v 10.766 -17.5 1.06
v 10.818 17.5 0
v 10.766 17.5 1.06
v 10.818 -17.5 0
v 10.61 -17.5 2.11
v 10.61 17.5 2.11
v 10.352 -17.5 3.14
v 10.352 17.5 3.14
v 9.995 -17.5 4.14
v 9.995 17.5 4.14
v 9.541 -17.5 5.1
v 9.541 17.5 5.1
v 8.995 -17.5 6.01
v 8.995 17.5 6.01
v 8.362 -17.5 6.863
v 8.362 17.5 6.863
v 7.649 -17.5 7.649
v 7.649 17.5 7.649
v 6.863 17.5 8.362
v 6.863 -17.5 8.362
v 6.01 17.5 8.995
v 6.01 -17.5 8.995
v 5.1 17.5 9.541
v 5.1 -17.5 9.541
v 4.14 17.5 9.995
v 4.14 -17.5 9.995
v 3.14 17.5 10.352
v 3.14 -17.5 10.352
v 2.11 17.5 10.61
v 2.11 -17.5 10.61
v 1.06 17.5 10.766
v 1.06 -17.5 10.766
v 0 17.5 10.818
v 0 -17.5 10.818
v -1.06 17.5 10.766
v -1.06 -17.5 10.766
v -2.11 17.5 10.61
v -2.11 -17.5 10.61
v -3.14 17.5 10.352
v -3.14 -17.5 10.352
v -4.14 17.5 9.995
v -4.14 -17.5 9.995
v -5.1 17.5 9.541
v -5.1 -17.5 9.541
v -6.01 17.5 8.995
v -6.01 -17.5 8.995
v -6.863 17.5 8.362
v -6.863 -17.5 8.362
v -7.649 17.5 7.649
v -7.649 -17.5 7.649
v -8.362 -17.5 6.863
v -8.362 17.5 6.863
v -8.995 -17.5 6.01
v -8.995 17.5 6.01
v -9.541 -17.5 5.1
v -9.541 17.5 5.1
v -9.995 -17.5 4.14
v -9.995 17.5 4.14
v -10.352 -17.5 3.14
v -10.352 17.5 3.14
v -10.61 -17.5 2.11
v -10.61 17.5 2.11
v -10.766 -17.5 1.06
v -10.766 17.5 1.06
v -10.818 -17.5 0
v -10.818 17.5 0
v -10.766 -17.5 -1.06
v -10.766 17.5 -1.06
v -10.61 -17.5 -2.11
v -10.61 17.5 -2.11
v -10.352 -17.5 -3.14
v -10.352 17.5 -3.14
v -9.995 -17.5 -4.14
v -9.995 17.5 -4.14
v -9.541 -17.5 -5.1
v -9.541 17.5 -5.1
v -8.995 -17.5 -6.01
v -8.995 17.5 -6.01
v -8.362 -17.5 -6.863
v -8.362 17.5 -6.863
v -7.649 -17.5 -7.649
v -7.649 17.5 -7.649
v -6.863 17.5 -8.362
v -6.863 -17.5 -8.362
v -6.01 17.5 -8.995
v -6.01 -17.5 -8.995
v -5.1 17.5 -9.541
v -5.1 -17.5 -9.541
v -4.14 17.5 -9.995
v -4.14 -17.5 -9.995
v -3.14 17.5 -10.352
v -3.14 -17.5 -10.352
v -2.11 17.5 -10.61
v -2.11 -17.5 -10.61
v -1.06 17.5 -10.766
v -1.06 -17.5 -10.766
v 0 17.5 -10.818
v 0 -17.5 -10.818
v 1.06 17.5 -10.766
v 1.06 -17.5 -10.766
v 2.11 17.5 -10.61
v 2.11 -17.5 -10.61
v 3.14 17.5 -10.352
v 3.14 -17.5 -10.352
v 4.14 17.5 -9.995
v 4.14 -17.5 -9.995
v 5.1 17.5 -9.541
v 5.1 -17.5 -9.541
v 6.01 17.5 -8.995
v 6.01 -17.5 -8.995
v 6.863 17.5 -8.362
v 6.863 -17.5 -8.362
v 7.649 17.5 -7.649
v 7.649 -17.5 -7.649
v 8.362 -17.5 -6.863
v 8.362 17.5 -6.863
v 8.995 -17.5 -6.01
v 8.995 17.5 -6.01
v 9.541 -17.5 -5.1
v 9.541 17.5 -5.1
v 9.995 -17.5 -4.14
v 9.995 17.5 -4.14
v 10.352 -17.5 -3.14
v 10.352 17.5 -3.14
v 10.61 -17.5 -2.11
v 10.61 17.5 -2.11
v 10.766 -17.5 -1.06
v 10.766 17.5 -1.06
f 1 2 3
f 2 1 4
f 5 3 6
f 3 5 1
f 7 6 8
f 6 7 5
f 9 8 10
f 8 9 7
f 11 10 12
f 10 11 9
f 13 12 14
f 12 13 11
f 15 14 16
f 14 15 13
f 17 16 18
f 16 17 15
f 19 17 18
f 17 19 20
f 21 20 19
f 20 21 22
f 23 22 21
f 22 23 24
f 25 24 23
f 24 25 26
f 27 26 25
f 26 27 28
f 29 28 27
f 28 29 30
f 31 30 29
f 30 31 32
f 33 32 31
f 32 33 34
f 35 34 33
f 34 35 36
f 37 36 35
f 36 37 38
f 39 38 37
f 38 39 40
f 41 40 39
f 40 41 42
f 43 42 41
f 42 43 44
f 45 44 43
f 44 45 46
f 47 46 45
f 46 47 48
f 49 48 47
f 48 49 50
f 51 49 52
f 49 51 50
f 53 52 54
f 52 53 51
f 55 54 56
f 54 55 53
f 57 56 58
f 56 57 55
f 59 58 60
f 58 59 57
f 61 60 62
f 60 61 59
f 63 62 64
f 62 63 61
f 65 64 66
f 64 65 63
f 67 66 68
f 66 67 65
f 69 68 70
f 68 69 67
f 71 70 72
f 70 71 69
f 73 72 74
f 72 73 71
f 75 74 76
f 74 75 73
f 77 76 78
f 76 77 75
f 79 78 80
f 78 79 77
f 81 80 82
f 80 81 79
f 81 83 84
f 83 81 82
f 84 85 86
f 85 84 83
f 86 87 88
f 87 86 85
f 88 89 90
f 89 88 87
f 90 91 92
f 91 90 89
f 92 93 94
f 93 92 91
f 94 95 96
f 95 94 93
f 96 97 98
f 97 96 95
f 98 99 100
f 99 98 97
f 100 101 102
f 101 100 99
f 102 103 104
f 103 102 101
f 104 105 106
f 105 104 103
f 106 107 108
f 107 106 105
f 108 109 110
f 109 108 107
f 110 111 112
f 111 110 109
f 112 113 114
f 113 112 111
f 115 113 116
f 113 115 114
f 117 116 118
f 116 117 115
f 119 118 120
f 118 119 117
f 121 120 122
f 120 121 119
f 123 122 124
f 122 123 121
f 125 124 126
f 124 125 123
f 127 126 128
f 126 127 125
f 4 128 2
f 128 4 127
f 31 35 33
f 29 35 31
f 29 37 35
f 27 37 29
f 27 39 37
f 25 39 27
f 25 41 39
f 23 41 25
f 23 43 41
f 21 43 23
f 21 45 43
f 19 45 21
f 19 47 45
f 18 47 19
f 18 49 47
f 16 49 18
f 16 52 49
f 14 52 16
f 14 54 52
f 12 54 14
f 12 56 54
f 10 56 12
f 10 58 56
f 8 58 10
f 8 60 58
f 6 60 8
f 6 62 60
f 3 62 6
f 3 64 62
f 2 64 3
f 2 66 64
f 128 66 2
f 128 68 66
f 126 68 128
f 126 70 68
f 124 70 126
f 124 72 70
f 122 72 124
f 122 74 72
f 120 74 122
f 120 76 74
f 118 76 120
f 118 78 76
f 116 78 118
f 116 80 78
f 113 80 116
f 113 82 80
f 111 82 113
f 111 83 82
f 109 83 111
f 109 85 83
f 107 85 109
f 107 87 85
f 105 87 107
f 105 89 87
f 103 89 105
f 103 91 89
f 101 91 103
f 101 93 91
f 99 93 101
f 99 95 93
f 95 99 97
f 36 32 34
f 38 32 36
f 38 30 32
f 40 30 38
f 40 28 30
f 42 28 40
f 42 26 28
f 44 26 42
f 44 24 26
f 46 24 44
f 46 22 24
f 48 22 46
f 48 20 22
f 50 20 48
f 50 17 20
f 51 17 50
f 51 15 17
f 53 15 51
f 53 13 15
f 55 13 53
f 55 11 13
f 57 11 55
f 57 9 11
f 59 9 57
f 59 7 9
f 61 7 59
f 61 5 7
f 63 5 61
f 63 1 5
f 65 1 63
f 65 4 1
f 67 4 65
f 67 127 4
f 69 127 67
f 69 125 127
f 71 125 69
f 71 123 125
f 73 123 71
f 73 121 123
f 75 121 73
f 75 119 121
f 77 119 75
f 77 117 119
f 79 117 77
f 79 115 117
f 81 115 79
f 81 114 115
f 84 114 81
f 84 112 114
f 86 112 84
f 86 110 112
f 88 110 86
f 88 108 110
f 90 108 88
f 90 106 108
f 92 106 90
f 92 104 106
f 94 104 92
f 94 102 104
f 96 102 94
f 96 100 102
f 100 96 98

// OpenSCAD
// This generates geometry for creating PVC pipe fittings
// Licenced under Creative Commons: Attribution, Share-Alike
//		http://creativecommons.org/licenses/by-sa/3.0/
// For attribution you can direct people to the original file on thingiverse:
// 		http://www.thingiverse.com/thing:222574

// ================ variables

//CUSTOMIZER VARIABLES

/* [Main] */

// Rated strength
schedule=40; // [40:schedule_40,1:schedule_80]

// Nominal size ("inch")
nom_idx=0; // [0:1/2,1:3/4,2:1,3:1 1/4,4:1 1/2,5:2,6:2 1/2,7:3,8:4,9:5,10:6,11:8,12:10,13:12,14:14,15:16]

// Length in mm
length=35;

// What to generate
generate=1; // [0:outside fitting,1:outside fitting - boolean diff,2:inside fitting,3:inside fitting - boolean diff,4:inside outside,5:inside outside - boolean diff]

// Tightness of fit, in mm (0=tight 0.3=snug 0.6=loose)
tightness=0.3; // 0.0,1.0

// In points per cylinder
resolution=64;

//CUSTOMIZER VARIABLES END
/* [Hidden] */

// =============== calculated variables
$fn=resolution;

// =============== program

// ---- Data
nom_data=["1/2","3/4","1","1 1/4","1 1/2","2","2 1/2","3","4","5","6","8","10","12","14","16"];
sch40id_data=[0.622,0.824,1.049,1.38,1.61,2.067,2.469,3.068,4.026,5.047,6.065,7.981,10.02,11.938,13.124,15];
sch40od_data=[0.84,1.05,1.315,1.66,1.9,2.375,2.875,3.5,4.5,5.563,6.625,8.625,10.75,12.75,14,16];
sch40pvcweight_data=[0.16,0.21,0.32,0.43,0.51,0.68,1.07,1.41,2.01,2.73,3.53,5.39,7.55,10.01,11.8,15.43];
sch40cpvcweight_data=[0.17,0.23,0.34,0.46,0.55,0.74,1.18,1.54,2.2,-1,3.86,5.81,8.24,10.89,-1,-1];
sch80id_data=[0.546,0.742,0.957,1.278,1.5,1.939,2.323,2.9,3.826,4.813,5.761,7.625,9.564,11.376,12.5,14.314];
sch80od_data=[0.84,1.05,1.315,1.66,1.9,2.375,2.875,3.5,4.5,5.563,6.625,8.625,10.75,12.75,14,16];
sch80pvcweight_data=[0.2,0.27,0.41,0.52,0.67,0.95,1.45,1.94,2.75,3.87,5.42,8.05,12,16.5,19.3,25.44];
sch80cpvcweight_data=[0.22,0.3,0.44,0.61,0.74,1.02,1.56,2.09,3.05,-1,5.82,8.83,13.09,18,-1,-1];
thou2mm=25.4;

//---- Functions

/////////////////////////////////////////////////////////
// module create_pvc_component()
// This generates geometry for creating PVC pipe fittings.
// In general, you should use create_pvc() instead because it gives more options.
// schedule = Rated strength (40 or 80)
// nom_idx = Nominal size index as described by nom_data[] 
// length - Length in mm
// generate - What to generate:
//		0="outside fitting"
//		1="outside fitting - boolean diff"
//		2="inside fitting"
//		3="inside fitting - boolean diff"
// tightness - Tightness of fit, in mm (0=tight 0.3=snug 0.6=loose)
module create_pvc_component(schedule=40,nom_idx=0,generate=0,tightness=0.02,length=35) {
	dia=
	(thou2mm*(schedule==80 ?
		(generate==0||generate==1?sch80od_data[nom_idx]:sch80id_data[nom_idx])
		:
		(generate==0||generate==1?sch40od_data[nom_idx]:sch40id_data[nom_idx])
	))
	+(generate==2||generate==3?-tightness:tightness);
	echo("========== INFO ==========");
	echo(str("for ",nom_data[nom_idx],"in (nom) pipe"));
	echo(str("created ",dia,"mm dia part"));
	echo(str("including ",(generate==2||generate==3?-tightness:tightness),"mm for fit"));
	echo("==========================");
	// now draw it
	rotate([90,0,0]) if(generate==1||generate==3){
		cylinder(r=dia/2,h=length,center=true);
	}else{
		difference() {
			cube([dia+10,dia+10,length],center=true);
			cylinder(r=dia/2,h=length,center=true);
		}
	}
};

/////////////////////////////////////////////////////////
// module create_pvc()
// This generates geometry for creating PVC pipe fittings.
// Just like create_pvc_component() only adds generate options 4 and 5
// schedule = Rated strength (40 or 80)
// nom_idx = Nominal size index as described by nom_data[] 
// length - Length in mm
// generate - What to generate:
//		0="outside fitting"
//		1="outside fitting - boolean diff"
//		2="inside fitting"
//		3="inside fitting - boolean diff"
//		4="inside outside"
//		5="inside outside - boolean diff"
// tightness - Tightness of fit, in mm (0=tight 0.3=snug 0.6=loose)
module create_pvc(schedule=40,nom_idx=0,generate=0,tightness=0.02,length=35) {
	if(generate<=3){
		create_pvc_component(schedule,nom_idx,generate,tightness,length);
	}
	else if(generate==4){
		difference() {
			create_pvc_component(schedule,nom_idx,1,tightness,length);
			create_pvc_component(schedule,nom_idx,3,tightness,length*2);
		}
	}
	else{
		union() {
			create_pvc_component(schedule,nom_idx,0,tightness,length);
			create_pvc_component(schedule,nom_idx,3,tightness,length);
		}
	}
};

//---- The program
create_pvc(schedule,nom_idx,generate,tightness,length);
